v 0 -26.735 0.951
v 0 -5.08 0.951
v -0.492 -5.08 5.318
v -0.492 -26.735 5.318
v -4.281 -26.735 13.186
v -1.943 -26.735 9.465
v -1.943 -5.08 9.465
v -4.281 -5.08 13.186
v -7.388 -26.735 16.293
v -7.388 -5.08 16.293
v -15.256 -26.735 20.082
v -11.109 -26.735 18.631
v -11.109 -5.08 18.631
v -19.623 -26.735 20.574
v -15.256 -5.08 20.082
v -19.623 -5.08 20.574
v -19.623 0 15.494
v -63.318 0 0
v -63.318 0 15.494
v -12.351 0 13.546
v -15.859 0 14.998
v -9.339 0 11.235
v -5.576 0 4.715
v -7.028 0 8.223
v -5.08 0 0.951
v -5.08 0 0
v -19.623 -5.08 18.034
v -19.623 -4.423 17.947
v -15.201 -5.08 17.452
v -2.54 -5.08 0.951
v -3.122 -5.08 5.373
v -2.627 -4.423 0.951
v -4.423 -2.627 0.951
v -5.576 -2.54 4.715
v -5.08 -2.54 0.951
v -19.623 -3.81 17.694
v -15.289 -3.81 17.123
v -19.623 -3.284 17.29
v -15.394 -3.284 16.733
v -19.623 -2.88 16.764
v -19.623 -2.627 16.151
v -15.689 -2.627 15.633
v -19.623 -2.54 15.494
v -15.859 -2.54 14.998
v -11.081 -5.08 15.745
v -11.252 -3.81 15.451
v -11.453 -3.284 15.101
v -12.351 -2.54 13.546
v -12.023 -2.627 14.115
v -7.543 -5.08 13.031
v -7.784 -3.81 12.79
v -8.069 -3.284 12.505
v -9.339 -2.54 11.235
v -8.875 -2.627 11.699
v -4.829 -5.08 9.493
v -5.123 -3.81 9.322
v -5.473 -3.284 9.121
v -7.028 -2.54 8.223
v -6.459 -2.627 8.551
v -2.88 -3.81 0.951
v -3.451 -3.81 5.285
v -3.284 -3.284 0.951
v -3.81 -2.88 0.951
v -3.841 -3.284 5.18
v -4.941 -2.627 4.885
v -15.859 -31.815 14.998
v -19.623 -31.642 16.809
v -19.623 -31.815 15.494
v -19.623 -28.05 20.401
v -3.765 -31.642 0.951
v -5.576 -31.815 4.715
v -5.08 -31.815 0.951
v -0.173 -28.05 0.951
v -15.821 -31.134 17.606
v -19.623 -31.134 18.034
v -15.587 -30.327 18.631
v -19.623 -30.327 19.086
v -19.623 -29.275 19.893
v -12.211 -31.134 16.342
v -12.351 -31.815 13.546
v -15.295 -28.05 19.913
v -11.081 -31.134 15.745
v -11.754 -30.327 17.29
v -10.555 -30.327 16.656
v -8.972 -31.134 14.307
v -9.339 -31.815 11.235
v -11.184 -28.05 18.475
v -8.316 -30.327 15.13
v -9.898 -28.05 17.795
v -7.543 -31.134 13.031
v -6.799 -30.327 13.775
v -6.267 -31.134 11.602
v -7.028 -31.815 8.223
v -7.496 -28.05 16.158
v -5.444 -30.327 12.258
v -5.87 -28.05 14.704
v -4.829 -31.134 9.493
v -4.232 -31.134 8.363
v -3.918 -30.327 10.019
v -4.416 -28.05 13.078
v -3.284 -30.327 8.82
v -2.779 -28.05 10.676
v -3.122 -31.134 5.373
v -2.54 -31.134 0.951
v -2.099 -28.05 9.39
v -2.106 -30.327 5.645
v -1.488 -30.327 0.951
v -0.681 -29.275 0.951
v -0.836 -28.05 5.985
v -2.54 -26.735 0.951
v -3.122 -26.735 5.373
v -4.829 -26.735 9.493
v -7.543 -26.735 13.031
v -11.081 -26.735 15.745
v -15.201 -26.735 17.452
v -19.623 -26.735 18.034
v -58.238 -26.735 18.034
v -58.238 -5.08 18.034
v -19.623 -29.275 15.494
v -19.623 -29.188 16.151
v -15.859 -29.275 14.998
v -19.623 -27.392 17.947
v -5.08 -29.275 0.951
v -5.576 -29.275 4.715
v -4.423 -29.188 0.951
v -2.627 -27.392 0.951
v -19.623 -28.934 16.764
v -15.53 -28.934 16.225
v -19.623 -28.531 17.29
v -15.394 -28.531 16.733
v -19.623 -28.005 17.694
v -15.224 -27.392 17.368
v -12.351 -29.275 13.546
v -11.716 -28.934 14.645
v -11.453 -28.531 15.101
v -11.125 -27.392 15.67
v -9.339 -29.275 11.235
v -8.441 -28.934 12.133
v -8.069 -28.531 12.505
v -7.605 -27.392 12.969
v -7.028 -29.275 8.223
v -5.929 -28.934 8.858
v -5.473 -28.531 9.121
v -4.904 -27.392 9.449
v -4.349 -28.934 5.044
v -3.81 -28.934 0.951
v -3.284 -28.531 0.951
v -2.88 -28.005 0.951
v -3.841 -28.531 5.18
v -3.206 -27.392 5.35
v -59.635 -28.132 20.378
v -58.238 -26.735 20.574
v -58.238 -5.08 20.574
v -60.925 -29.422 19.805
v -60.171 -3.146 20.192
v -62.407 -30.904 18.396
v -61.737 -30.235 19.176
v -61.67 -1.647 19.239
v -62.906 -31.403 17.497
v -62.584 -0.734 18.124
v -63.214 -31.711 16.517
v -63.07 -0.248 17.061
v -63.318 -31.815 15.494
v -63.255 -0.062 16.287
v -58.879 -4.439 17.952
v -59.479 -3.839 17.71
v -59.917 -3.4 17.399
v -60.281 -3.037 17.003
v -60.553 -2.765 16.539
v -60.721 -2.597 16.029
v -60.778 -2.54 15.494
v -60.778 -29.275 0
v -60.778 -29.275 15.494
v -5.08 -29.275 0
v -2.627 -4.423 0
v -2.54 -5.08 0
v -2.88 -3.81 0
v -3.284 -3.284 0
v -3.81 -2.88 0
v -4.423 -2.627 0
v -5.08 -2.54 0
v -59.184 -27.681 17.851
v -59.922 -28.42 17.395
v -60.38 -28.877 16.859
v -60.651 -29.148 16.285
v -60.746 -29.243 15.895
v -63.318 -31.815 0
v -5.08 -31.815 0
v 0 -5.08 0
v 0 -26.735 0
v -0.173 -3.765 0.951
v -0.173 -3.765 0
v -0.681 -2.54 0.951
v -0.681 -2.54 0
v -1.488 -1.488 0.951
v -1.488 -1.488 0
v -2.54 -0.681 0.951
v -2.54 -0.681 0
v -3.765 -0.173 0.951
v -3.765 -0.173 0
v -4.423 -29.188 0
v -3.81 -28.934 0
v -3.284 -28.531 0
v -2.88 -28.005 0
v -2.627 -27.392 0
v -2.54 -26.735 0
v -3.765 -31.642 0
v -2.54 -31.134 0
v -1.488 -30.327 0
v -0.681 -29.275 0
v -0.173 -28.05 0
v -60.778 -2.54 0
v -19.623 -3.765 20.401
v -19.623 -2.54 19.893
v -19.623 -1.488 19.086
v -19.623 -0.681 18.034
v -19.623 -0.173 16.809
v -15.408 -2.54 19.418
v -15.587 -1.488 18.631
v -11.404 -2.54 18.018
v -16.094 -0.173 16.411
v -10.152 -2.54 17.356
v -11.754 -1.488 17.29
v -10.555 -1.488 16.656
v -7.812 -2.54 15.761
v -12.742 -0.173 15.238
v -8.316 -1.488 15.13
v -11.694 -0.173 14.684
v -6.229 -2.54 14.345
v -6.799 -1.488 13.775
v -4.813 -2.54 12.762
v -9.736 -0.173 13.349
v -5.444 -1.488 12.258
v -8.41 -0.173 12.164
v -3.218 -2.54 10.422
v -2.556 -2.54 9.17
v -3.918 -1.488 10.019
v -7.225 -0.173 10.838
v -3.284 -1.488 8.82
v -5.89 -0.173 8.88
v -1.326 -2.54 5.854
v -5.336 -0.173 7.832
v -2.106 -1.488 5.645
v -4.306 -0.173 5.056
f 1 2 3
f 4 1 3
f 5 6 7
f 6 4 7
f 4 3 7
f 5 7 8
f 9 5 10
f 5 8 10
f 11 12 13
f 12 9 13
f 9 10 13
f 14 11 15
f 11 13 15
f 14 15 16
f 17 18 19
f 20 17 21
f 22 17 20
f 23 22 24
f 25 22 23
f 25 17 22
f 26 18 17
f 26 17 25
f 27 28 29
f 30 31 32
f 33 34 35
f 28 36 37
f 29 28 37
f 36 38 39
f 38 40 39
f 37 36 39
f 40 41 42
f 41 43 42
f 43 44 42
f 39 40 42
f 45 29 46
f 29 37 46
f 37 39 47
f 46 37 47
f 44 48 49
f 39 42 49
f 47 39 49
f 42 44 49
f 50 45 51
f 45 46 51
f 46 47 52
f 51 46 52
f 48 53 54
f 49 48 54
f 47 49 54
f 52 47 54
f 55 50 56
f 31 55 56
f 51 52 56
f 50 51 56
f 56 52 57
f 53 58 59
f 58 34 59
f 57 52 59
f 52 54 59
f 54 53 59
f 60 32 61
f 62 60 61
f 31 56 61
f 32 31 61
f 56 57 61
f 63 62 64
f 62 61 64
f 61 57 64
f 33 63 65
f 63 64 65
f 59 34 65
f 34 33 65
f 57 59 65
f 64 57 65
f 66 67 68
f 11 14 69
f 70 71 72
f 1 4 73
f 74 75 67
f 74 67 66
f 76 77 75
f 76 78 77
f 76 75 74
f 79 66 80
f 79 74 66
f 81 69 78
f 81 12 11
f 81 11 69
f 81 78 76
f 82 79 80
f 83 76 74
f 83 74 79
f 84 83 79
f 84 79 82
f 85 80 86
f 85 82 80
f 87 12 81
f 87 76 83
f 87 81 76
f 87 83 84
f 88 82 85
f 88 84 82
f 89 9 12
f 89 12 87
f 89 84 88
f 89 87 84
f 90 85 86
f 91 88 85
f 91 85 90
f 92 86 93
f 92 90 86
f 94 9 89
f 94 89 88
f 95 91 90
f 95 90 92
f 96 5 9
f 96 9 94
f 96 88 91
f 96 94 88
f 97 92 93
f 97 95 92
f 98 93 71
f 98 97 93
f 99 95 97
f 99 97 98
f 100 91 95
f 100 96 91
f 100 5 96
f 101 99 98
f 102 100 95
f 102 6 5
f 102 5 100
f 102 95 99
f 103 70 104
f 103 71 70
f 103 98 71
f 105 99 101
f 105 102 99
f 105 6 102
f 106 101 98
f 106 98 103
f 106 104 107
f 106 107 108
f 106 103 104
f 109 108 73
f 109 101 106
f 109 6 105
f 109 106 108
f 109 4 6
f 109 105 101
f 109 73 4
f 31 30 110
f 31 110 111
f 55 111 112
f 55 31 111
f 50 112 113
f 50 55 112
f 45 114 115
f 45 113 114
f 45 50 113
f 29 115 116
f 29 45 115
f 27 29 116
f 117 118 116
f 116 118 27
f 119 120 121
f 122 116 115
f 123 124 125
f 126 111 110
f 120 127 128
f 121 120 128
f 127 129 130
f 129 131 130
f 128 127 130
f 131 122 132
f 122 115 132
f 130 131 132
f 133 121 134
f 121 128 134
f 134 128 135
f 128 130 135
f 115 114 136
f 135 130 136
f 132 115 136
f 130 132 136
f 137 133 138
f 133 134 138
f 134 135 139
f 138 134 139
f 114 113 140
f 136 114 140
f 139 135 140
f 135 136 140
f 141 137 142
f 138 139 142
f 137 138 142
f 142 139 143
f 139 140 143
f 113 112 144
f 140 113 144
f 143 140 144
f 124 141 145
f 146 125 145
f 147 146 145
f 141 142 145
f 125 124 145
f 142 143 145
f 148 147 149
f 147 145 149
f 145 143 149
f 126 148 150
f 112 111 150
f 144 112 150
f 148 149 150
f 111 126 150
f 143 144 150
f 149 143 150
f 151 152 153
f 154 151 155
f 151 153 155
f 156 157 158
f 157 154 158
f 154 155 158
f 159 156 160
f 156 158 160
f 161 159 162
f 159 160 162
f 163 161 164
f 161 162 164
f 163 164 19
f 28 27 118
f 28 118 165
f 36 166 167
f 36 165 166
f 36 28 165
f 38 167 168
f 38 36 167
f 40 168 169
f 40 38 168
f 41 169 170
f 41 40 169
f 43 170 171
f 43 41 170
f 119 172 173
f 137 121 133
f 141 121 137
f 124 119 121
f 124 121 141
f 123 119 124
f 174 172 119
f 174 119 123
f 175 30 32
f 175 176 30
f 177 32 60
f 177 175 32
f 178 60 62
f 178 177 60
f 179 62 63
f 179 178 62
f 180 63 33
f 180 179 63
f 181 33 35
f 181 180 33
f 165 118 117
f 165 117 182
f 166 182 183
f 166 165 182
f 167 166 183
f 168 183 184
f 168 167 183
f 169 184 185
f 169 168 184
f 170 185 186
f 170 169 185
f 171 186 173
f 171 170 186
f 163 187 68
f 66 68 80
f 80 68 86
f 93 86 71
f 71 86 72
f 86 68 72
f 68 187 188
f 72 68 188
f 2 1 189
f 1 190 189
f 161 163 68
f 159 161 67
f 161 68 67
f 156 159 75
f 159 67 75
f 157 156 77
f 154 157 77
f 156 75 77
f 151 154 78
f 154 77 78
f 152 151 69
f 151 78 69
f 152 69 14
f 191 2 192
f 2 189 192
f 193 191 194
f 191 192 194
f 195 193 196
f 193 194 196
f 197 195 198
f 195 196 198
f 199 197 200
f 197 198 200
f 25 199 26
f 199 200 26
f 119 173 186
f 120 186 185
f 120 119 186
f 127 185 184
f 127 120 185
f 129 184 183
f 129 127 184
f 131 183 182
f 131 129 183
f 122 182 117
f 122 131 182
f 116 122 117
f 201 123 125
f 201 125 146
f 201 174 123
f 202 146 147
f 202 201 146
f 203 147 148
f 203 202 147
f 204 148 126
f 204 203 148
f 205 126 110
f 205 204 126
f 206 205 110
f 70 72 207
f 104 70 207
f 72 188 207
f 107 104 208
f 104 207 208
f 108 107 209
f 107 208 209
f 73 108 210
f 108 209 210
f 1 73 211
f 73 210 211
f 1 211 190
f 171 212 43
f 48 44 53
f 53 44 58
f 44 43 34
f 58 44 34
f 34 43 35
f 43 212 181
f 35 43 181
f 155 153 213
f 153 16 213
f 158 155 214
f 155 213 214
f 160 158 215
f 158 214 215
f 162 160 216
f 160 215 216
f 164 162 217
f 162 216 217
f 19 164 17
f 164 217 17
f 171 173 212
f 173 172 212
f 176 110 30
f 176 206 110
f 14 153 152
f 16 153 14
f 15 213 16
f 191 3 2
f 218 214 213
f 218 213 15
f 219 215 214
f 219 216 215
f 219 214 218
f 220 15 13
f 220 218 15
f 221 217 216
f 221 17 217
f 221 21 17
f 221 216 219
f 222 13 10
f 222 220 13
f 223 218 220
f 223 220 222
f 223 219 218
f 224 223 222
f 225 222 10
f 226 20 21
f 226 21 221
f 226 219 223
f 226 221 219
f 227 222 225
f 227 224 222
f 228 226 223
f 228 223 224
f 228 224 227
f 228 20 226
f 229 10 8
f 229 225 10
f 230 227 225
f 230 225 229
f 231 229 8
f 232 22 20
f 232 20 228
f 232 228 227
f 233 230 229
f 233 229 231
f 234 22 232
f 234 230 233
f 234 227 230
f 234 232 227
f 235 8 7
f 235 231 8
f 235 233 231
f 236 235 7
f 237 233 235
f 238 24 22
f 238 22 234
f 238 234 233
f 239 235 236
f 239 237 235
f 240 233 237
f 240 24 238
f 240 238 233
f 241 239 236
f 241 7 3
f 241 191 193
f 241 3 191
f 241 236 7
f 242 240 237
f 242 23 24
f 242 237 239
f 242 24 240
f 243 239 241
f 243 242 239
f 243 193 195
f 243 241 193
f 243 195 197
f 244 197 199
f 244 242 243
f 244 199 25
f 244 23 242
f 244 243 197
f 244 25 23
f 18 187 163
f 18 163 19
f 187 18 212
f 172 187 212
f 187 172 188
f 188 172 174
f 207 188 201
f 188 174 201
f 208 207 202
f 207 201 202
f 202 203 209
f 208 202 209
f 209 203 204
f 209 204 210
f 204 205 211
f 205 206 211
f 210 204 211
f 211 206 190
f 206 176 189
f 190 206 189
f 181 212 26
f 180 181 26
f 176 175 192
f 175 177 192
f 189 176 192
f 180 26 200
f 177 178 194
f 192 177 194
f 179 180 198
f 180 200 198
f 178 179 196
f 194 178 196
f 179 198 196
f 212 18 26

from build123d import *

# Parameters (mm, degrees)
F0_W     = 63.317589
F0_H     = 31.814769
F1_DEPTH = 20.574
F2_R     = 19.622728
F3_R     = 5.08
F4_T     = -2.54


with BuildPart() as f1:
    # F0 (on Top) → F1 (new body)
    with BuildSketch(Plane.XY):
        with Locations((-31.658794, -15.907384)):
            Rectangle(F0_W, F0_H)
    extrude(amount=F1_DEPTH)

    # F2
    f2_edges = [f1.edges().sort_by_distance(p)[0] for p in [
        (0, -15.907384, 20.574),
    ]]
    fillet(f2_edges, radius=F2_R)

    # F3
    f3_edges = [f1.edges().sort_by_distance(p)[0] for p in [
        (-41.470159, -31.814769, 20.574),
        (-41.470159, 0, 20.574),
        (-63.317589, -15.907384, 20.574),
    ]]
    fillet(f3_edges, radius=F3_R)

    # F4
    f4_openings = [f1.faces().sort_by_distance(p)[0] for p in [
        (-31.827557, -15.907384, 0),
    ]]
    offset(amount=F4_T, openings=f4_openings)


solid = f1.part
